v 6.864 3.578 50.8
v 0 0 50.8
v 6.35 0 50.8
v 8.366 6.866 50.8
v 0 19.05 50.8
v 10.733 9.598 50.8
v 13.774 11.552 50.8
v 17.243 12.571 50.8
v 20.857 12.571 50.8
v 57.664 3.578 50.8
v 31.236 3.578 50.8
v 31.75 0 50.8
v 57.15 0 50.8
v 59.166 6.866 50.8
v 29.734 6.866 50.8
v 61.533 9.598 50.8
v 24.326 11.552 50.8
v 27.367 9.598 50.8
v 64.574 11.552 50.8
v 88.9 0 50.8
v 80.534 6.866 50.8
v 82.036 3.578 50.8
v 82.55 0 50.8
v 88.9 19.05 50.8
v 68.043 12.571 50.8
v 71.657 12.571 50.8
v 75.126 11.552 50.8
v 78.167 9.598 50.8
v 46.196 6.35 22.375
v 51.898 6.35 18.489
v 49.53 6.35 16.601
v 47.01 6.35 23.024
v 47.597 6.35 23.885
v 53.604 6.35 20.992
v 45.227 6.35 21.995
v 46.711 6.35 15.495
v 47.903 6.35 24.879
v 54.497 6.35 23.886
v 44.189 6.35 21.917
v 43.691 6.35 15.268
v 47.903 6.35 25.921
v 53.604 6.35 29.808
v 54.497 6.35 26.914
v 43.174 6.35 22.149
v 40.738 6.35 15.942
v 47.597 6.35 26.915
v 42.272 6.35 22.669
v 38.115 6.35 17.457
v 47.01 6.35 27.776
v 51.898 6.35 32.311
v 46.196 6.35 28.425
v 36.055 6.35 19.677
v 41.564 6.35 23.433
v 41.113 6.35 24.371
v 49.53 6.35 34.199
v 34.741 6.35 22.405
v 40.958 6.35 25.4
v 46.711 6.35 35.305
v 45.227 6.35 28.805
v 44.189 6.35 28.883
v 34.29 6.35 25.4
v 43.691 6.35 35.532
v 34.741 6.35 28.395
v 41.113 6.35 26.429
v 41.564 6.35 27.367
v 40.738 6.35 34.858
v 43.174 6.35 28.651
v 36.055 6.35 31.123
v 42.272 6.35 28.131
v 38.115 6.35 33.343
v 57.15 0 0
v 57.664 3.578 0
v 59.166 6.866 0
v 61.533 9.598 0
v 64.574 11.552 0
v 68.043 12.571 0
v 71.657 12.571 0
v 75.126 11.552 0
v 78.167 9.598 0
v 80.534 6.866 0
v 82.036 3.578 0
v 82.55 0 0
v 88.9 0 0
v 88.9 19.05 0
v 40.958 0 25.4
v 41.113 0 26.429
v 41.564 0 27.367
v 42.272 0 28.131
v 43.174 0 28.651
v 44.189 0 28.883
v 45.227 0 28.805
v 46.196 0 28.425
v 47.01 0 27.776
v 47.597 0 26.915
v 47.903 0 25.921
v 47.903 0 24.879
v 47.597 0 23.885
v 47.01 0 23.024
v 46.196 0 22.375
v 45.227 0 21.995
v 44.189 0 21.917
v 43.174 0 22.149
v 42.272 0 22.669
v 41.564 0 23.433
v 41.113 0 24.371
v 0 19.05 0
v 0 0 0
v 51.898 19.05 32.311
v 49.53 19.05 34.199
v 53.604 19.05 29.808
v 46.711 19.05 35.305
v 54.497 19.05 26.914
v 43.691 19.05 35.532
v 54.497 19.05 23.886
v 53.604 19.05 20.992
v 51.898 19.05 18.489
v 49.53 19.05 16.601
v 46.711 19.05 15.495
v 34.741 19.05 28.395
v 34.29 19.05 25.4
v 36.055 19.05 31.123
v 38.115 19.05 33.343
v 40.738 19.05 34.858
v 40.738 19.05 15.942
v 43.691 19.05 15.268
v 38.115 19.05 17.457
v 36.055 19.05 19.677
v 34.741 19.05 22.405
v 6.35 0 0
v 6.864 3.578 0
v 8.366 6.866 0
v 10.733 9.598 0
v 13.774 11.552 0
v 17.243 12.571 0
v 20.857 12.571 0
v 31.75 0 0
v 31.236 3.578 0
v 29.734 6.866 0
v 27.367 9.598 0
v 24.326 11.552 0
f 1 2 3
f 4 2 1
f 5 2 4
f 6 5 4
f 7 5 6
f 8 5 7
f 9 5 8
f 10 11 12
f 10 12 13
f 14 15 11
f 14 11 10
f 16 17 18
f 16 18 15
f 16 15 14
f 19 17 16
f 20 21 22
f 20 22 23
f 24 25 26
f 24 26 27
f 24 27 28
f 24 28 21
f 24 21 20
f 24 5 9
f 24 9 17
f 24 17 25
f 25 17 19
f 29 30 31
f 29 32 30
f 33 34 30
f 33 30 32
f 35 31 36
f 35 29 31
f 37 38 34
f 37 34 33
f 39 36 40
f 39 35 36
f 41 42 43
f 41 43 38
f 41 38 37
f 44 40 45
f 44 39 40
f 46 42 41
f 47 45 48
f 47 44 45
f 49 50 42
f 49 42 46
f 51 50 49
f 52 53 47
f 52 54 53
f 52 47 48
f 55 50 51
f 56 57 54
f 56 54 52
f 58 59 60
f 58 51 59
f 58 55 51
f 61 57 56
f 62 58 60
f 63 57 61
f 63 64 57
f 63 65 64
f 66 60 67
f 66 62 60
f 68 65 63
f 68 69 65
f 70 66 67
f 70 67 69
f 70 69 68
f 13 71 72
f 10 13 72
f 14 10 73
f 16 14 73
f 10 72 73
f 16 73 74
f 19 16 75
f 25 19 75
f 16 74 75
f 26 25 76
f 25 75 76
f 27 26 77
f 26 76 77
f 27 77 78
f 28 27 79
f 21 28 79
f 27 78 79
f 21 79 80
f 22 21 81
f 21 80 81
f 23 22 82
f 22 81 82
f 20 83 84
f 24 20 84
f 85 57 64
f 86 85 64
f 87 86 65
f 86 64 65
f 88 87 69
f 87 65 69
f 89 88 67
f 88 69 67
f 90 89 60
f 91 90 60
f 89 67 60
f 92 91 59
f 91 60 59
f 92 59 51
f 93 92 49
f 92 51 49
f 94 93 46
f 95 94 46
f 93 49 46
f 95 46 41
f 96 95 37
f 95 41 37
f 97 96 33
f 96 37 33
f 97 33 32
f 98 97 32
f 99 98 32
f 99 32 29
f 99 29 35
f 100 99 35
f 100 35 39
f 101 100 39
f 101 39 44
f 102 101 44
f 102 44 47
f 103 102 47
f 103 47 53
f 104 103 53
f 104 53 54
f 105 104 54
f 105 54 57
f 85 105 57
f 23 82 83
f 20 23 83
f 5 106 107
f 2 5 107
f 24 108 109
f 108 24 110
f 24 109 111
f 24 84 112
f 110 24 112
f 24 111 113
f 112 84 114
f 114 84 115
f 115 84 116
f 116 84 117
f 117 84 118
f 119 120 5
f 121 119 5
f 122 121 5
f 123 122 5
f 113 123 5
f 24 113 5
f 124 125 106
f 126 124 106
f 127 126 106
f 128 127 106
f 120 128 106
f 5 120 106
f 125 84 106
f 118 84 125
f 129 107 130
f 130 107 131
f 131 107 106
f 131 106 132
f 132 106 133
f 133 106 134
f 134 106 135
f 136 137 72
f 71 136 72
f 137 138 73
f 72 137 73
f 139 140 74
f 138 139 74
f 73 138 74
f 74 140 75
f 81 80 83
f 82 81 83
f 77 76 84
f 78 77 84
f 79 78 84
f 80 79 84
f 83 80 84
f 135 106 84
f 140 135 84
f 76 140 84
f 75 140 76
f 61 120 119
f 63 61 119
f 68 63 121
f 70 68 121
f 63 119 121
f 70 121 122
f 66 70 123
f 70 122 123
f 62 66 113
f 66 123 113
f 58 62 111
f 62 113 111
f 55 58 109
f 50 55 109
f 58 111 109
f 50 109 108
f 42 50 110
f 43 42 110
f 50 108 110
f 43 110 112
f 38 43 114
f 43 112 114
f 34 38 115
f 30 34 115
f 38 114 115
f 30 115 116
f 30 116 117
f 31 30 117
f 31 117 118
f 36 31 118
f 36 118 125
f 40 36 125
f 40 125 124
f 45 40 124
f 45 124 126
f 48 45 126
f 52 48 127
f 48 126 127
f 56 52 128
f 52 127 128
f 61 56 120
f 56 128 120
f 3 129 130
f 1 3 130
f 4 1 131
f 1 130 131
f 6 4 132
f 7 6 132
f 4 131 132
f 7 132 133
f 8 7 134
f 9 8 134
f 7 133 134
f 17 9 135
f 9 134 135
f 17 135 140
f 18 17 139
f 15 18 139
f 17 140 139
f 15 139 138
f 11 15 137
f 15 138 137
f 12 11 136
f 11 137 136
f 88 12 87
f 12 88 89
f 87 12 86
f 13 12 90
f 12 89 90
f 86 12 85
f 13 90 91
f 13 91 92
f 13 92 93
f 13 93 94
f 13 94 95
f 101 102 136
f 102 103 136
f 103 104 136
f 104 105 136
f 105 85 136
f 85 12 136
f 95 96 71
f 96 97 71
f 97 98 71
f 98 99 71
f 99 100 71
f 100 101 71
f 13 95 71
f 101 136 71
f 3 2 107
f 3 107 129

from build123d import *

# Parameters (mm, degrees)
F1_DEPTH = 50.8
F2_R     = 10.16
F3_DEPTH = 12.7
F4_R     = 3.4925
F5_DEPTH = 6.351


with BuildPart() as f1:
    # F0 (on Top) → F1 (new body)
    with BuildSketch(Plane.XY):
        with BuildLine():
            Line((0, 19.05), (0, 0))
            Line((0, 0), (6.35, 0))
            ThreePointArc((6.35, 0), (19.05, 12.7), (31.75, 0))
            Line((31.75, 0), (57.15, 0))
            ThreePointArc((57.15, 0), (69.85, 12.7), (82.55, 0))
            Line((82.55, 0), (88.9, 0))
            Line((88.9, 0), (88.9, 19.05))
            Line((88.9, 19.05), (0, 19.05))
        make_face()
    extrude(amount=F1_DEPTH)

    # F2 (on face) → F3 (cut)
    with BuildSketch(Plane(origin=(0, 19.05, 0), x_dir=(-1, 0, 0), z_dir=(0, 1, 0))):
        with Locations((-44.45, 25.4)):
            Circle(F2_R)
    extrude(amount=-F3_DEPTH, mode=Mode.SUBTRACT)

    # F4 (on face) → F5 (cut, through all)
    with BuildSketch(Plane(origin=(0, 6.35, 0), x_dir=(-1, 0, 0), z_dir=(0, 1, 0))):
        with Locations((-44.45, 25.4)):
            Circle(F4_R)
    extrude(amount=-F5_DEPTH, mode=Mode.SUBTRACT)


solid = f1.part
